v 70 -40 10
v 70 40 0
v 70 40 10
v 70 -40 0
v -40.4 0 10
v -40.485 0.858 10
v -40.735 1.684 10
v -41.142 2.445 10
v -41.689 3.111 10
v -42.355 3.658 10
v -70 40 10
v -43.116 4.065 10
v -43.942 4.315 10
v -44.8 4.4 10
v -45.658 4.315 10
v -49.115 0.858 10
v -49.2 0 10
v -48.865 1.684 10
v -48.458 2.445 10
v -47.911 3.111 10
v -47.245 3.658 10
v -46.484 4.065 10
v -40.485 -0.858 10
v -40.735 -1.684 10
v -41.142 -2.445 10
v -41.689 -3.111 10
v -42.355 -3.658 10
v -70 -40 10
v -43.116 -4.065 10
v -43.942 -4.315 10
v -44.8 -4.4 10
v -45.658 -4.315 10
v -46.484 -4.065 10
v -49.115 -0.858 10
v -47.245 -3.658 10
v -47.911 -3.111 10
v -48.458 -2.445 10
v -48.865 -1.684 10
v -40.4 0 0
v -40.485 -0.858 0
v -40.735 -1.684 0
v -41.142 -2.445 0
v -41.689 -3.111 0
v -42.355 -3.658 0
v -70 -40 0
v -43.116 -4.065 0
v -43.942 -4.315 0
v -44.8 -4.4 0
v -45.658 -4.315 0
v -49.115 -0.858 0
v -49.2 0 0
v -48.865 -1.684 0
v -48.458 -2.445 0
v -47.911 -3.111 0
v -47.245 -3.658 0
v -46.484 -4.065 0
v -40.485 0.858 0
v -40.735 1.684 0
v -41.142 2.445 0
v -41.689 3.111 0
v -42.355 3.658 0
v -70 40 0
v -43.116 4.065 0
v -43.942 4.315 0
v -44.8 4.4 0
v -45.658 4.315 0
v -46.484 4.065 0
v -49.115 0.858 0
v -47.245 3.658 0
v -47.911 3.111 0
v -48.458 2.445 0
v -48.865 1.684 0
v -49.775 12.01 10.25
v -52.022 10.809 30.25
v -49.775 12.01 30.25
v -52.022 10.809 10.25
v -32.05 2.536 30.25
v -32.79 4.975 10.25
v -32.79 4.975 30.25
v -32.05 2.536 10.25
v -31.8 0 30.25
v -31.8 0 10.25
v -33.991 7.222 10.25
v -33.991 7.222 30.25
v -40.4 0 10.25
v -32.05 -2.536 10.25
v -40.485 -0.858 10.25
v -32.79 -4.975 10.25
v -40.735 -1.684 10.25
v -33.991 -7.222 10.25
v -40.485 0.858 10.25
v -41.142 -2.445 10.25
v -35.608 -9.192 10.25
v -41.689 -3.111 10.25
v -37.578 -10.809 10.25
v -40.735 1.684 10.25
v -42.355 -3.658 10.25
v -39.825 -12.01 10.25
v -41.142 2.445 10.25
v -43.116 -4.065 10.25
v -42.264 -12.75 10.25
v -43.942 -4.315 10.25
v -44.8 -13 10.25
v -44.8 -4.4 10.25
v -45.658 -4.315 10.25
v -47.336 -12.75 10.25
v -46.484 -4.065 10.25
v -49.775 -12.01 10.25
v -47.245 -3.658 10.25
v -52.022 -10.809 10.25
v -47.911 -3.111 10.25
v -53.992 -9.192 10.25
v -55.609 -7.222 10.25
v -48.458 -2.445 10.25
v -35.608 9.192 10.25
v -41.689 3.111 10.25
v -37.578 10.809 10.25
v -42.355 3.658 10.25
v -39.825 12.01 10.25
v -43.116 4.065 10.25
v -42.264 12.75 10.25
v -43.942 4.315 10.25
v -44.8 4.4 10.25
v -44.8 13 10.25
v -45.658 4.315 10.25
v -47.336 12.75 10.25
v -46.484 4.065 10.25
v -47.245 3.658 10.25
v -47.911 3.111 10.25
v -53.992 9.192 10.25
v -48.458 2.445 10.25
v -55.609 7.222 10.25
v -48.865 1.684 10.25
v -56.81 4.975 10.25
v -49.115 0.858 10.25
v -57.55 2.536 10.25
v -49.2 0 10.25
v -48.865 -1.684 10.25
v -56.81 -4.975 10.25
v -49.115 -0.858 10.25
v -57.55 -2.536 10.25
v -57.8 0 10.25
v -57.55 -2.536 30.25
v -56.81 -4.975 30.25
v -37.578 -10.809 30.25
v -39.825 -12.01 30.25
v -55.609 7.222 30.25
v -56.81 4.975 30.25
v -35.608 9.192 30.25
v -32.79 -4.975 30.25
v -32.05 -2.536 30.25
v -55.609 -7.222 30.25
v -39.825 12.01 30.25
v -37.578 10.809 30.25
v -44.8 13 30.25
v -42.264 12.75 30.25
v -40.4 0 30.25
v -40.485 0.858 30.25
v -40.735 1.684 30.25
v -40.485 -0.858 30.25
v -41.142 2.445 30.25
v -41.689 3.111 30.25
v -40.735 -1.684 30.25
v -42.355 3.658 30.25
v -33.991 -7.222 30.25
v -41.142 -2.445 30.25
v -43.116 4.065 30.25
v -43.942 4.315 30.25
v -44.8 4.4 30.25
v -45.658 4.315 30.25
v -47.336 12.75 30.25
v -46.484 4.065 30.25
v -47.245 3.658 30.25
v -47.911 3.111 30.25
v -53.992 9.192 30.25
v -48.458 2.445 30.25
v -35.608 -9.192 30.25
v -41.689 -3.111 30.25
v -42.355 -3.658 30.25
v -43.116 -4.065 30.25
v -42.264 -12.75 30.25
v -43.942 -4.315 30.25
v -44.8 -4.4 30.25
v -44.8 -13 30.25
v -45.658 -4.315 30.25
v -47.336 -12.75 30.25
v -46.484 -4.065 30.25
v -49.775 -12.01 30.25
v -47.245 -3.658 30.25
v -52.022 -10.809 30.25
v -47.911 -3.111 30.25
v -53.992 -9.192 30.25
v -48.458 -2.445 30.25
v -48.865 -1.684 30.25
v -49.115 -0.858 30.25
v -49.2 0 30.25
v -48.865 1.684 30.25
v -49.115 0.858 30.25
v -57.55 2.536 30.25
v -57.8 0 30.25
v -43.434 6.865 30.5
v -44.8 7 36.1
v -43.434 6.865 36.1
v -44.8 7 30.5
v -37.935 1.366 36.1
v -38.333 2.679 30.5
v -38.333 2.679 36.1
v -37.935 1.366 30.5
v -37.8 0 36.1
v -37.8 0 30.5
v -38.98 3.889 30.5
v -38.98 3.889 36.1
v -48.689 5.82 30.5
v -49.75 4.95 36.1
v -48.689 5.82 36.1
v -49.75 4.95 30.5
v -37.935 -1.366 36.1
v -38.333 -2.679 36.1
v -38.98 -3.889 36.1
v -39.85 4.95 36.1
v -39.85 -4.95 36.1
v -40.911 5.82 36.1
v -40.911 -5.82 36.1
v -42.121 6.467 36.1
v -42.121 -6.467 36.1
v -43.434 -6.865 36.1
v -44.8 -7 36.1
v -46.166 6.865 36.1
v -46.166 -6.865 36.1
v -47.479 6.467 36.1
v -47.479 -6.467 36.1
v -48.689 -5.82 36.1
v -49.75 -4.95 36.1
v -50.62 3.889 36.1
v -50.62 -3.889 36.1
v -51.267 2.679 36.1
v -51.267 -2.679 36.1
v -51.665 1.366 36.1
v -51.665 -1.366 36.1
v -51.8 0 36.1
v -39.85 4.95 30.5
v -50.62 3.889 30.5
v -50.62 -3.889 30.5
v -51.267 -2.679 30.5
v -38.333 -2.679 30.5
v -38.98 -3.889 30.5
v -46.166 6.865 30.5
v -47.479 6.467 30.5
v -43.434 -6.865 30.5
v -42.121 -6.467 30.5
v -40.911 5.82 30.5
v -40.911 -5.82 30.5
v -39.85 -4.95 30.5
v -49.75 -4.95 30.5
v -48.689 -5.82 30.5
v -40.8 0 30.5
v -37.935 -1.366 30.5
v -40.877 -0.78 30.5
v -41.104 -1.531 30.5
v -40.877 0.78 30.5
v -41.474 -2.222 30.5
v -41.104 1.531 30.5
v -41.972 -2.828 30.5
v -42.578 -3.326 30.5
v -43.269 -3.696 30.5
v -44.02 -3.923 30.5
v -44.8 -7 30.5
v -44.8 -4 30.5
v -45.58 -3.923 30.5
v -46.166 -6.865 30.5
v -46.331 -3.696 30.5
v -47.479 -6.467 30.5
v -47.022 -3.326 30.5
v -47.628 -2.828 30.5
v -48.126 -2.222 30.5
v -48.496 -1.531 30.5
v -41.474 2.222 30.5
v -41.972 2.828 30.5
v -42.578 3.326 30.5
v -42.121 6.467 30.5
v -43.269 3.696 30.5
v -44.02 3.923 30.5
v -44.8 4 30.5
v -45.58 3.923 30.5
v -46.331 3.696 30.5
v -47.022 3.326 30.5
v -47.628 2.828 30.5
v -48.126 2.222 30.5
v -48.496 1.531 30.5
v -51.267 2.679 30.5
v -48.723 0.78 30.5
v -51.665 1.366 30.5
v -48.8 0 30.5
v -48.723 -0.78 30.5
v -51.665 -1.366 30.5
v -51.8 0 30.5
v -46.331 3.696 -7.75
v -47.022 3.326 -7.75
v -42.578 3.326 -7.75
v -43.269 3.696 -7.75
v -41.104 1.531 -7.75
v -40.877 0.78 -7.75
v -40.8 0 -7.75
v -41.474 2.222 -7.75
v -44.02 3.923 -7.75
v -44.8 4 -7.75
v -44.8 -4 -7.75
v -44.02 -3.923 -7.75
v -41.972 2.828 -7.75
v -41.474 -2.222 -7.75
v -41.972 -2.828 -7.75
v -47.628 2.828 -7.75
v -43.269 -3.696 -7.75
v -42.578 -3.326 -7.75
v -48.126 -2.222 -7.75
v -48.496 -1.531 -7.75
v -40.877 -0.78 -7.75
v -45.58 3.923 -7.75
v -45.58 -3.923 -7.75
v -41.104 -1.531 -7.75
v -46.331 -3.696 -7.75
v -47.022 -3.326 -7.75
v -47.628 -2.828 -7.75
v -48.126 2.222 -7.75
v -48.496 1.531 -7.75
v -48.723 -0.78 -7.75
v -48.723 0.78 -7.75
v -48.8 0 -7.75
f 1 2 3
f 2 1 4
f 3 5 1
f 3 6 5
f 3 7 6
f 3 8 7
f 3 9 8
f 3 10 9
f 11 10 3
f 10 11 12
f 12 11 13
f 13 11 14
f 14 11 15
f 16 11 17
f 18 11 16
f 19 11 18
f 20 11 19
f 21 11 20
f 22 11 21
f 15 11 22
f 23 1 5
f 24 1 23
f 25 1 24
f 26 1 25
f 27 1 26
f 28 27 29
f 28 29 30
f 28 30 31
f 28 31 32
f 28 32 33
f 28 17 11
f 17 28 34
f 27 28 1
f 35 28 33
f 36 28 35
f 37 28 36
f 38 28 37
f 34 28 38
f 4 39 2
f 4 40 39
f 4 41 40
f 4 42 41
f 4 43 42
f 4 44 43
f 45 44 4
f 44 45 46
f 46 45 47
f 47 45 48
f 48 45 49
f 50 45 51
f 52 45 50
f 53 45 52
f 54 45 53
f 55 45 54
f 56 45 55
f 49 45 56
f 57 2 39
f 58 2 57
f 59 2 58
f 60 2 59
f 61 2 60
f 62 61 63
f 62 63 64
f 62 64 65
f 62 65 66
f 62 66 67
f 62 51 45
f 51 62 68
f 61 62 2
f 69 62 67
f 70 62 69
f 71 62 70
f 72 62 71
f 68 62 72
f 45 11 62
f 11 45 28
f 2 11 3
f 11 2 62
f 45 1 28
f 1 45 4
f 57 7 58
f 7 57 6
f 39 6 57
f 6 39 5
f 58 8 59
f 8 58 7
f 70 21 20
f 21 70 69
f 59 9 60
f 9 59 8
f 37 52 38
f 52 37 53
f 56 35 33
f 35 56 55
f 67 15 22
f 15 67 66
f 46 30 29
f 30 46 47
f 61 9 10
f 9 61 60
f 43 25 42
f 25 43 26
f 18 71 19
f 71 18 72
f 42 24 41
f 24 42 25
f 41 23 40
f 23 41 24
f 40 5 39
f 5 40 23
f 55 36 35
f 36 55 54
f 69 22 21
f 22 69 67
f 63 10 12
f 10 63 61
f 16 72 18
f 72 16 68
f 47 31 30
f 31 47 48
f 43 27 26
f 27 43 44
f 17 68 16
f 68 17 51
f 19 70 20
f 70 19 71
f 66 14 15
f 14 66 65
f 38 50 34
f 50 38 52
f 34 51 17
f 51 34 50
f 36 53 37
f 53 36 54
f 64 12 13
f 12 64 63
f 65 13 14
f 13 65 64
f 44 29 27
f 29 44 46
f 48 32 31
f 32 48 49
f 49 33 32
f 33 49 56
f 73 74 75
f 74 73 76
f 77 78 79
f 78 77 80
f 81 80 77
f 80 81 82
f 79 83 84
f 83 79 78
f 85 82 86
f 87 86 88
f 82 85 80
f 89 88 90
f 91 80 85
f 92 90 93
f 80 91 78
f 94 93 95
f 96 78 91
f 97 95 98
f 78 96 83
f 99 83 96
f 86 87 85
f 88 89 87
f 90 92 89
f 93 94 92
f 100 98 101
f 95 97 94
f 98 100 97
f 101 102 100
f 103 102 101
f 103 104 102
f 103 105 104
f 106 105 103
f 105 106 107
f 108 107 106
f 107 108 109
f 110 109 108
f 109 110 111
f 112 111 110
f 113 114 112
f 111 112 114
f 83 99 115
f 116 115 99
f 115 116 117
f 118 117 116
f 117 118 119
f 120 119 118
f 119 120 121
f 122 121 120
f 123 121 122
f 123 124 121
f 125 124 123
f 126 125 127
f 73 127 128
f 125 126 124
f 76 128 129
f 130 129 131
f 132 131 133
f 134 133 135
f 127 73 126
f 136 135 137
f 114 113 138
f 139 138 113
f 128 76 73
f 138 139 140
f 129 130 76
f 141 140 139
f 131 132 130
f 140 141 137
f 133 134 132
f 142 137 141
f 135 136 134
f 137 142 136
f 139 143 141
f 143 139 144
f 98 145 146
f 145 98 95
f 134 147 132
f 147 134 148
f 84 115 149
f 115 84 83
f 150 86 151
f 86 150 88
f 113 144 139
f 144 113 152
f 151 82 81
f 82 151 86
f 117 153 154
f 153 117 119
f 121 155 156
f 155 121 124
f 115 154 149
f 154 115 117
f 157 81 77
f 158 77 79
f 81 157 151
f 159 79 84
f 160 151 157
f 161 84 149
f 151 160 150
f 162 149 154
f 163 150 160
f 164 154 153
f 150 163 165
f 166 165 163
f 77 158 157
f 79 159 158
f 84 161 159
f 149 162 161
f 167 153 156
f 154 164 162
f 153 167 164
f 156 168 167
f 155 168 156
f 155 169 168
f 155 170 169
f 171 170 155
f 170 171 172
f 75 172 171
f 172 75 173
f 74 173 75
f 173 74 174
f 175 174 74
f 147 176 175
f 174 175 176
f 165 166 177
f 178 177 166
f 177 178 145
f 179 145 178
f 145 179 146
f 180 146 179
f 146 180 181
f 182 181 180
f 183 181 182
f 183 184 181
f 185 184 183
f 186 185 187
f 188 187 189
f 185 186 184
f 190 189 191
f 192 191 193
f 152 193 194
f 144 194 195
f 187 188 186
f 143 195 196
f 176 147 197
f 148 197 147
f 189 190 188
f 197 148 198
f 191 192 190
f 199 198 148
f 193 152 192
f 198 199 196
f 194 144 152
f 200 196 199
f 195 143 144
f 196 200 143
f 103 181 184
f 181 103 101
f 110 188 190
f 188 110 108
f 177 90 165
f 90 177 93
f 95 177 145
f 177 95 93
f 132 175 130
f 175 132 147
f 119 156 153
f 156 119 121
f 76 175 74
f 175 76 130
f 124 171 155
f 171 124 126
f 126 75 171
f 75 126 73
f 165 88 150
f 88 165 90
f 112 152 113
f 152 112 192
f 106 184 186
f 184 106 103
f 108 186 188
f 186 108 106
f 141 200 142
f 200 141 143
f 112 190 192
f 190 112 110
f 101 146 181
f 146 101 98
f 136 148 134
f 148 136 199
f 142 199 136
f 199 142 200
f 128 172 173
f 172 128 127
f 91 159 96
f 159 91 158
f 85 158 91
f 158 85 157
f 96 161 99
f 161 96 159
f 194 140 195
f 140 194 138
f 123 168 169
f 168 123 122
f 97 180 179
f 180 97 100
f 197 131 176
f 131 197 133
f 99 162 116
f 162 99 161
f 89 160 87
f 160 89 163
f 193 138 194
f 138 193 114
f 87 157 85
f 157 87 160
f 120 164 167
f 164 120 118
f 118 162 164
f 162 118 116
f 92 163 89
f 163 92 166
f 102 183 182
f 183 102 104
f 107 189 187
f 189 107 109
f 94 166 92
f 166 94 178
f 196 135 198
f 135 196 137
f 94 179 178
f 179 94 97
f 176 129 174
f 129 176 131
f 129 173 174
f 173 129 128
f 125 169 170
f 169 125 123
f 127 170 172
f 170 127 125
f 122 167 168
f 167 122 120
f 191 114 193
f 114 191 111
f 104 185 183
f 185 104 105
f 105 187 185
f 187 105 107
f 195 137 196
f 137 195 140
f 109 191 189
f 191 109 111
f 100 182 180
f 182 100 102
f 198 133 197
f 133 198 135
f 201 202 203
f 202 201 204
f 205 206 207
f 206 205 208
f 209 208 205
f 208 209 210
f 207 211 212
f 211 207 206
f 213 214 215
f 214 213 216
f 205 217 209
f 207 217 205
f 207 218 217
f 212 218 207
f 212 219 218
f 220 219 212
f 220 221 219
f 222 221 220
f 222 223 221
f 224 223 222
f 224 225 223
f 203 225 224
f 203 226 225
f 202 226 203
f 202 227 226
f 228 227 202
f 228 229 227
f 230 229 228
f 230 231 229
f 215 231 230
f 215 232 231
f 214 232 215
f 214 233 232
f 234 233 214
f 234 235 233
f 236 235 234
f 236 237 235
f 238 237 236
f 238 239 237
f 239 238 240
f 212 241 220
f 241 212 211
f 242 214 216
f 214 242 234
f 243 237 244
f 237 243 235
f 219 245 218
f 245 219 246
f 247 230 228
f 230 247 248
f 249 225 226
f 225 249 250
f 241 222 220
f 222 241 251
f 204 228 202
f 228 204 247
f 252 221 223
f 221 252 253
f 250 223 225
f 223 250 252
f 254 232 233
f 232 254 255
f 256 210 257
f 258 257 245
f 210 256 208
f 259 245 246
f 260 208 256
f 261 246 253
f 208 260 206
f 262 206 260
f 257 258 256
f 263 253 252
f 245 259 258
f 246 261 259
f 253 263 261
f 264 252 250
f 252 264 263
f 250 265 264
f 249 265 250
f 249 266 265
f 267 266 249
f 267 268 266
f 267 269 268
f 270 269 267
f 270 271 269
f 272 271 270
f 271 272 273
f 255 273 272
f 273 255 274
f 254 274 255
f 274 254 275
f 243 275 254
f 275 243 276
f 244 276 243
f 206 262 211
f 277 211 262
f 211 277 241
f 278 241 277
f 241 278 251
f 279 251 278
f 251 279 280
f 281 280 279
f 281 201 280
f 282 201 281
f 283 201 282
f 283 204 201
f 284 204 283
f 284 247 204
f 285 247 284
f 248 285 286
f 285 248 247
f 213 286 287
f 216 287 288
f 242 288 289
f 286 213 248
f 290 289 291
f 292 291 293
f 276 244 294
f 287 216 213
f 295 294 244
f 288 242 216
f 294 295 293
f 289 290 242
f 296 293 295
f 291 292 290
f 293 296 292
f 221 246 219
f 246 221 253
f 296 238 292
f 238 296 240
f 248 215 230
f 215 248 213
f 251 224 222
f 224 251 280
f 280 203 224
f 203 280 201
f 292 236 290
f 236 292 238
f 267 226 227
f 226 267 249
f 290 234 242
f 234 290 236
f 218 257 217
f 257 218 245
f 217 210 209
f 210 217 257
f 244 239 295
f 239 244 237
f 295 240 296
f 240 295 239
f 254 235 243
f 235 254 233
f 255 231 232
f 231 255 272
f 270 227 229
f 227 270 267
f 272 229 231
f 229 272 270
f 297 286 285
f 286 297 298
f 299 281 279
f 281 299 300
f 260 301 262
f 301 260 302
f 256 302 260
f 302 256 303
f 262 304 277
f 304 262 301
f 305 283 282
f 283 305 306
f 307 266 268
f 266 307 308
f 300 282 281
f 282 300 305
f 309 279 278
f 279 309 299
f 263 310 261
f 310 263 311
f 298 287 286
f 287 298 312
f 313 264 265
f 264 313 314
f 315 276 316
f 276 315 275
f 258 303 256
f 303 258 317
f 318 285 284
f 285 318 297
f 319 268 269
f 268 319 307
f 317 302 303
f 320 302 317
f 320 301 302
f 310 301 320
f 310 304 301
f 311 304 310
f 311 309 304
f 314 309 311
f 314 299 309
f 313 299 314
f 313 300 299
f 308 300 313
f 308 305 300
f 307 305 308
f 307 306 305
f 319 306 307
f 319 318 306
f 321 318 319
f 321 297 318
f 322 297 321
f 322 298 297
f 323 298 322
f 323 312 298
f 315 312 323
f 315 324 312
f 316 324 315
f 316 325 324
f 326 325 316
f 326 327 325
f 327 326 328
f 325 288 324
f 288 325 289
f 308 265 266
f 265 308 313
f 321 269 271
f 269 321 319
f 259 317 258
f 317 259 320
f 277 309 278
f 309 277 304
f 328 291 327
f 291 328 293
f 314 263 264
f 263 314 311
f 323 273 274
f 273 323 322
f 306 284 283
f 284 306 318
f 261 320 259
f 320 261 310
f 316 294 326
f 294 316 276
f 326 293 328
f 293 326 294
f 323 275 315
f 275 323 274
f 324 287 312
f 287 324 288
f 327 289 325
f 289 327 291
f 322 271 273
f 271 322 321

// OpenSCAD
$fn = 32;

// ------------------------------------------------------------------------
// Standoff columns: 1 d26 standoffs, bolts d8
// Every part is its own module, assembly() places them once.
// ------------------------------------------------------------------------

// --- part 1 ---
module base_plate() {
  difference() {
    translate([-70, -40, 0]) cube([140, 80, 10]);
    translate([-44.8, 0, -1]) cylinder(h = 12, d = 8.8);
  }
}

// --- part 2 ---
module spacer() {
  difference() {
      translate([0, 0, 0]) cylinder(h = 20, d = 26);
      translate([0, 0, -1]) cylinder(h = 22, d = 8.8);
    }
}

// --- part 3 ---
module bolt() {
  cylinder(h = 5.6, d = 14);
  translate([0, 0, -38.25]) cylinder(h = 38.25, d = 8);
}

// --- assembly ---
module assembly() {
  translate([0, 0, 0]) rotate([0, 0, 0]) base_plate();
  translate([-44.8, 0, 10.25]) rotate([0, 0, 0]) spacer();
  translate([-44.8, 0, 30.5]) rotate([0, 0, 0]) bolt();
}

assembly();
